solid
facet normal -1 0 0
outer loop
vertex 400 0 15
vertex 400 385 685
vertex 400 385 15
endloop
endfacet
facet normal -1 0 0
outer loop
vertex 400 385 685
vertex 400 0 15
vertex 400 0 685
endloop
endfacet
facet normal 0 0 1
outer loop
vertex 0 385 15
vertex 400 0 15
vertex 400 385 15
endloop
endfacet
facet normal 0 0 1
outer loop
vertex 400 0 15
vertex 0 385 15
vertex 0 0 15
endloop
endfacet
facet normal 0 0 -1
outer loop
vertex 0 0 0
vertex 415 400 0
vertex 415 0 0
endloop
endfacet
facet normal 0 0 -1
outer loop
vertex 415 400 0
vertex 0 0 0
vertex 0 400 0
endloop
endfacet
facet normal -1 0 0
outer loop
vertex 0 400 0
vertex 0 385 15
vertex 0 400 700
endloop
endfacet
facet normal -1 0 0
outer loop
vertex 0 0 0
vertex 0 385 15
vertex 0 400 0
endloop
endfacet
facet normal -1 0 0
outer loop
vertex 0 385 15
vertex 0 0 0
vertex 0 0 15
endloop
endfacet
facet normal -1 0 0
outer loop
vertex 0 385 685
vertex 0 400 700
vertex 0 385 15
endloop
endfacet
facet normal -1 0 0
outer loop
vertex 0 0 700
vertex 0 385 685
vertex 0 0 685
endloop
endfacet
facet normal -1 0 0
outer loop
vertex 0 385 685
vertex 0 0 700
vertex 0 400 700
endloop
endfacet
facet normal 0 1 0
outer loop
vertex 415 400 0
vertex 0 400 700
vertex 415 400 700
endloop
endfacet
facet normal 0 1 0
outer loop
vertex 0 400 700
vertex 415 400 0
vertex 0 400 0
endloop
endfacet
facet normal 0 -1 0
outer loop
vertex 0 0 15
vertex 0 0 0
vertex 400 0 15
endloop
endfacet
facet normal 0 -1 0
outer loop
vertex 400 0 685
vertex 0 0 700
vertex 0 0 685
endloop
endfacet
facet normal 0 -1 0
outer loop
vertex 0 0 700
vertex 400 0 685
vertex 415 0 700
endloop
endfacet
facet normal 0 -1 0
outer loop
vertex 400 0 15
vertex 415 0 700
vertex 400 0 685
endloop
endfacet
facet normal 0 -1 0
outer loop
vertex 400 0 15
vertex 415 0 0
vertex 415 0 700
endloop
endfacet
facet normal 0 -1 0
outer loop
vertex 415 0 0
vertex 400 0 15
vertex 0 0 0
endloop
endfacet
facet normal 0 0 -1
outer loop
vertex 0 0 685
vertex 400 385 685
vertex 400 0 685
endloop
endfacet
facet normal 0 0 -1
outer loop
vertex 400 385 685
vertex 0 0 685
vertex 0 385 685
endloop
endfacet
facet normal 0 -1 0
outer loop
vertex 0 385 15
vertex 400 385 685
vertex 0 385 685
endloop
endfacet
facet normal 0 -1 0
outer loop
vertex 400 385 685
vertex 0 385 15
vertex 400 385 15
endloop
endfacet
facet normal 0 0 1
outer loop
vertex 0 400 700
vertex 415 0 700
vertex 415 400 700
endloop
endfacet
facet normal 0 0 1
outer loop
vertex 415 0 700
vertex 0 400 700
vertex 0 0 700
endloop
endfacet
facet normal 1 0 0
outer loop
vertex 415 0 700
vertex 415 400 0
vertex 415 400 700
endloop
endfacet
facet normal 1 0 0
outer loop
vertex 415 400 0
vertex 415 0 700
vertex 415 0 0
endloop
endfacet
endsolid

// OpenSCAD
// Hiding a piece whose face is welded to its neighbours'.
//
// A bottom board, a back panel and a top board, flush at the rear the way a "board on board"
// carcass is. The union welds their three rear faces into one rectangle spanning all three
// pieces, so a triangle of it lies wholly inside no piece's box. Hiding used to drop only
// whole triangles, so with the whole group hidden that rectangle stayed behind as a grey plane
// belonging to nothing. Hiding must cut each piece's box out of such triangles instead.
//
// Written in the one-line form: `// @group X   @name Y` names the piece under it and says
// which group it belongs to, without opening a block.

hr = 15;

// @group Unit   @name Bottom
cube([400, 400, hr]);
// @group Unit   @name Back
translate([0, 400 - hr, hr]) cube([400, hr, 700 - 2*hr]);
// @group Unit   @name Top
translate([0, 0, 700 - hr]) cube([400, 400, hr]);

// A board of another group, flush with the unit's right side: hiding the unit must leave it
// whole, and hiding it must leave the unit whole.
// @group Neighbour   @name Side board
translate([400, 0, 0]) cube([hr, 400, 700]);
